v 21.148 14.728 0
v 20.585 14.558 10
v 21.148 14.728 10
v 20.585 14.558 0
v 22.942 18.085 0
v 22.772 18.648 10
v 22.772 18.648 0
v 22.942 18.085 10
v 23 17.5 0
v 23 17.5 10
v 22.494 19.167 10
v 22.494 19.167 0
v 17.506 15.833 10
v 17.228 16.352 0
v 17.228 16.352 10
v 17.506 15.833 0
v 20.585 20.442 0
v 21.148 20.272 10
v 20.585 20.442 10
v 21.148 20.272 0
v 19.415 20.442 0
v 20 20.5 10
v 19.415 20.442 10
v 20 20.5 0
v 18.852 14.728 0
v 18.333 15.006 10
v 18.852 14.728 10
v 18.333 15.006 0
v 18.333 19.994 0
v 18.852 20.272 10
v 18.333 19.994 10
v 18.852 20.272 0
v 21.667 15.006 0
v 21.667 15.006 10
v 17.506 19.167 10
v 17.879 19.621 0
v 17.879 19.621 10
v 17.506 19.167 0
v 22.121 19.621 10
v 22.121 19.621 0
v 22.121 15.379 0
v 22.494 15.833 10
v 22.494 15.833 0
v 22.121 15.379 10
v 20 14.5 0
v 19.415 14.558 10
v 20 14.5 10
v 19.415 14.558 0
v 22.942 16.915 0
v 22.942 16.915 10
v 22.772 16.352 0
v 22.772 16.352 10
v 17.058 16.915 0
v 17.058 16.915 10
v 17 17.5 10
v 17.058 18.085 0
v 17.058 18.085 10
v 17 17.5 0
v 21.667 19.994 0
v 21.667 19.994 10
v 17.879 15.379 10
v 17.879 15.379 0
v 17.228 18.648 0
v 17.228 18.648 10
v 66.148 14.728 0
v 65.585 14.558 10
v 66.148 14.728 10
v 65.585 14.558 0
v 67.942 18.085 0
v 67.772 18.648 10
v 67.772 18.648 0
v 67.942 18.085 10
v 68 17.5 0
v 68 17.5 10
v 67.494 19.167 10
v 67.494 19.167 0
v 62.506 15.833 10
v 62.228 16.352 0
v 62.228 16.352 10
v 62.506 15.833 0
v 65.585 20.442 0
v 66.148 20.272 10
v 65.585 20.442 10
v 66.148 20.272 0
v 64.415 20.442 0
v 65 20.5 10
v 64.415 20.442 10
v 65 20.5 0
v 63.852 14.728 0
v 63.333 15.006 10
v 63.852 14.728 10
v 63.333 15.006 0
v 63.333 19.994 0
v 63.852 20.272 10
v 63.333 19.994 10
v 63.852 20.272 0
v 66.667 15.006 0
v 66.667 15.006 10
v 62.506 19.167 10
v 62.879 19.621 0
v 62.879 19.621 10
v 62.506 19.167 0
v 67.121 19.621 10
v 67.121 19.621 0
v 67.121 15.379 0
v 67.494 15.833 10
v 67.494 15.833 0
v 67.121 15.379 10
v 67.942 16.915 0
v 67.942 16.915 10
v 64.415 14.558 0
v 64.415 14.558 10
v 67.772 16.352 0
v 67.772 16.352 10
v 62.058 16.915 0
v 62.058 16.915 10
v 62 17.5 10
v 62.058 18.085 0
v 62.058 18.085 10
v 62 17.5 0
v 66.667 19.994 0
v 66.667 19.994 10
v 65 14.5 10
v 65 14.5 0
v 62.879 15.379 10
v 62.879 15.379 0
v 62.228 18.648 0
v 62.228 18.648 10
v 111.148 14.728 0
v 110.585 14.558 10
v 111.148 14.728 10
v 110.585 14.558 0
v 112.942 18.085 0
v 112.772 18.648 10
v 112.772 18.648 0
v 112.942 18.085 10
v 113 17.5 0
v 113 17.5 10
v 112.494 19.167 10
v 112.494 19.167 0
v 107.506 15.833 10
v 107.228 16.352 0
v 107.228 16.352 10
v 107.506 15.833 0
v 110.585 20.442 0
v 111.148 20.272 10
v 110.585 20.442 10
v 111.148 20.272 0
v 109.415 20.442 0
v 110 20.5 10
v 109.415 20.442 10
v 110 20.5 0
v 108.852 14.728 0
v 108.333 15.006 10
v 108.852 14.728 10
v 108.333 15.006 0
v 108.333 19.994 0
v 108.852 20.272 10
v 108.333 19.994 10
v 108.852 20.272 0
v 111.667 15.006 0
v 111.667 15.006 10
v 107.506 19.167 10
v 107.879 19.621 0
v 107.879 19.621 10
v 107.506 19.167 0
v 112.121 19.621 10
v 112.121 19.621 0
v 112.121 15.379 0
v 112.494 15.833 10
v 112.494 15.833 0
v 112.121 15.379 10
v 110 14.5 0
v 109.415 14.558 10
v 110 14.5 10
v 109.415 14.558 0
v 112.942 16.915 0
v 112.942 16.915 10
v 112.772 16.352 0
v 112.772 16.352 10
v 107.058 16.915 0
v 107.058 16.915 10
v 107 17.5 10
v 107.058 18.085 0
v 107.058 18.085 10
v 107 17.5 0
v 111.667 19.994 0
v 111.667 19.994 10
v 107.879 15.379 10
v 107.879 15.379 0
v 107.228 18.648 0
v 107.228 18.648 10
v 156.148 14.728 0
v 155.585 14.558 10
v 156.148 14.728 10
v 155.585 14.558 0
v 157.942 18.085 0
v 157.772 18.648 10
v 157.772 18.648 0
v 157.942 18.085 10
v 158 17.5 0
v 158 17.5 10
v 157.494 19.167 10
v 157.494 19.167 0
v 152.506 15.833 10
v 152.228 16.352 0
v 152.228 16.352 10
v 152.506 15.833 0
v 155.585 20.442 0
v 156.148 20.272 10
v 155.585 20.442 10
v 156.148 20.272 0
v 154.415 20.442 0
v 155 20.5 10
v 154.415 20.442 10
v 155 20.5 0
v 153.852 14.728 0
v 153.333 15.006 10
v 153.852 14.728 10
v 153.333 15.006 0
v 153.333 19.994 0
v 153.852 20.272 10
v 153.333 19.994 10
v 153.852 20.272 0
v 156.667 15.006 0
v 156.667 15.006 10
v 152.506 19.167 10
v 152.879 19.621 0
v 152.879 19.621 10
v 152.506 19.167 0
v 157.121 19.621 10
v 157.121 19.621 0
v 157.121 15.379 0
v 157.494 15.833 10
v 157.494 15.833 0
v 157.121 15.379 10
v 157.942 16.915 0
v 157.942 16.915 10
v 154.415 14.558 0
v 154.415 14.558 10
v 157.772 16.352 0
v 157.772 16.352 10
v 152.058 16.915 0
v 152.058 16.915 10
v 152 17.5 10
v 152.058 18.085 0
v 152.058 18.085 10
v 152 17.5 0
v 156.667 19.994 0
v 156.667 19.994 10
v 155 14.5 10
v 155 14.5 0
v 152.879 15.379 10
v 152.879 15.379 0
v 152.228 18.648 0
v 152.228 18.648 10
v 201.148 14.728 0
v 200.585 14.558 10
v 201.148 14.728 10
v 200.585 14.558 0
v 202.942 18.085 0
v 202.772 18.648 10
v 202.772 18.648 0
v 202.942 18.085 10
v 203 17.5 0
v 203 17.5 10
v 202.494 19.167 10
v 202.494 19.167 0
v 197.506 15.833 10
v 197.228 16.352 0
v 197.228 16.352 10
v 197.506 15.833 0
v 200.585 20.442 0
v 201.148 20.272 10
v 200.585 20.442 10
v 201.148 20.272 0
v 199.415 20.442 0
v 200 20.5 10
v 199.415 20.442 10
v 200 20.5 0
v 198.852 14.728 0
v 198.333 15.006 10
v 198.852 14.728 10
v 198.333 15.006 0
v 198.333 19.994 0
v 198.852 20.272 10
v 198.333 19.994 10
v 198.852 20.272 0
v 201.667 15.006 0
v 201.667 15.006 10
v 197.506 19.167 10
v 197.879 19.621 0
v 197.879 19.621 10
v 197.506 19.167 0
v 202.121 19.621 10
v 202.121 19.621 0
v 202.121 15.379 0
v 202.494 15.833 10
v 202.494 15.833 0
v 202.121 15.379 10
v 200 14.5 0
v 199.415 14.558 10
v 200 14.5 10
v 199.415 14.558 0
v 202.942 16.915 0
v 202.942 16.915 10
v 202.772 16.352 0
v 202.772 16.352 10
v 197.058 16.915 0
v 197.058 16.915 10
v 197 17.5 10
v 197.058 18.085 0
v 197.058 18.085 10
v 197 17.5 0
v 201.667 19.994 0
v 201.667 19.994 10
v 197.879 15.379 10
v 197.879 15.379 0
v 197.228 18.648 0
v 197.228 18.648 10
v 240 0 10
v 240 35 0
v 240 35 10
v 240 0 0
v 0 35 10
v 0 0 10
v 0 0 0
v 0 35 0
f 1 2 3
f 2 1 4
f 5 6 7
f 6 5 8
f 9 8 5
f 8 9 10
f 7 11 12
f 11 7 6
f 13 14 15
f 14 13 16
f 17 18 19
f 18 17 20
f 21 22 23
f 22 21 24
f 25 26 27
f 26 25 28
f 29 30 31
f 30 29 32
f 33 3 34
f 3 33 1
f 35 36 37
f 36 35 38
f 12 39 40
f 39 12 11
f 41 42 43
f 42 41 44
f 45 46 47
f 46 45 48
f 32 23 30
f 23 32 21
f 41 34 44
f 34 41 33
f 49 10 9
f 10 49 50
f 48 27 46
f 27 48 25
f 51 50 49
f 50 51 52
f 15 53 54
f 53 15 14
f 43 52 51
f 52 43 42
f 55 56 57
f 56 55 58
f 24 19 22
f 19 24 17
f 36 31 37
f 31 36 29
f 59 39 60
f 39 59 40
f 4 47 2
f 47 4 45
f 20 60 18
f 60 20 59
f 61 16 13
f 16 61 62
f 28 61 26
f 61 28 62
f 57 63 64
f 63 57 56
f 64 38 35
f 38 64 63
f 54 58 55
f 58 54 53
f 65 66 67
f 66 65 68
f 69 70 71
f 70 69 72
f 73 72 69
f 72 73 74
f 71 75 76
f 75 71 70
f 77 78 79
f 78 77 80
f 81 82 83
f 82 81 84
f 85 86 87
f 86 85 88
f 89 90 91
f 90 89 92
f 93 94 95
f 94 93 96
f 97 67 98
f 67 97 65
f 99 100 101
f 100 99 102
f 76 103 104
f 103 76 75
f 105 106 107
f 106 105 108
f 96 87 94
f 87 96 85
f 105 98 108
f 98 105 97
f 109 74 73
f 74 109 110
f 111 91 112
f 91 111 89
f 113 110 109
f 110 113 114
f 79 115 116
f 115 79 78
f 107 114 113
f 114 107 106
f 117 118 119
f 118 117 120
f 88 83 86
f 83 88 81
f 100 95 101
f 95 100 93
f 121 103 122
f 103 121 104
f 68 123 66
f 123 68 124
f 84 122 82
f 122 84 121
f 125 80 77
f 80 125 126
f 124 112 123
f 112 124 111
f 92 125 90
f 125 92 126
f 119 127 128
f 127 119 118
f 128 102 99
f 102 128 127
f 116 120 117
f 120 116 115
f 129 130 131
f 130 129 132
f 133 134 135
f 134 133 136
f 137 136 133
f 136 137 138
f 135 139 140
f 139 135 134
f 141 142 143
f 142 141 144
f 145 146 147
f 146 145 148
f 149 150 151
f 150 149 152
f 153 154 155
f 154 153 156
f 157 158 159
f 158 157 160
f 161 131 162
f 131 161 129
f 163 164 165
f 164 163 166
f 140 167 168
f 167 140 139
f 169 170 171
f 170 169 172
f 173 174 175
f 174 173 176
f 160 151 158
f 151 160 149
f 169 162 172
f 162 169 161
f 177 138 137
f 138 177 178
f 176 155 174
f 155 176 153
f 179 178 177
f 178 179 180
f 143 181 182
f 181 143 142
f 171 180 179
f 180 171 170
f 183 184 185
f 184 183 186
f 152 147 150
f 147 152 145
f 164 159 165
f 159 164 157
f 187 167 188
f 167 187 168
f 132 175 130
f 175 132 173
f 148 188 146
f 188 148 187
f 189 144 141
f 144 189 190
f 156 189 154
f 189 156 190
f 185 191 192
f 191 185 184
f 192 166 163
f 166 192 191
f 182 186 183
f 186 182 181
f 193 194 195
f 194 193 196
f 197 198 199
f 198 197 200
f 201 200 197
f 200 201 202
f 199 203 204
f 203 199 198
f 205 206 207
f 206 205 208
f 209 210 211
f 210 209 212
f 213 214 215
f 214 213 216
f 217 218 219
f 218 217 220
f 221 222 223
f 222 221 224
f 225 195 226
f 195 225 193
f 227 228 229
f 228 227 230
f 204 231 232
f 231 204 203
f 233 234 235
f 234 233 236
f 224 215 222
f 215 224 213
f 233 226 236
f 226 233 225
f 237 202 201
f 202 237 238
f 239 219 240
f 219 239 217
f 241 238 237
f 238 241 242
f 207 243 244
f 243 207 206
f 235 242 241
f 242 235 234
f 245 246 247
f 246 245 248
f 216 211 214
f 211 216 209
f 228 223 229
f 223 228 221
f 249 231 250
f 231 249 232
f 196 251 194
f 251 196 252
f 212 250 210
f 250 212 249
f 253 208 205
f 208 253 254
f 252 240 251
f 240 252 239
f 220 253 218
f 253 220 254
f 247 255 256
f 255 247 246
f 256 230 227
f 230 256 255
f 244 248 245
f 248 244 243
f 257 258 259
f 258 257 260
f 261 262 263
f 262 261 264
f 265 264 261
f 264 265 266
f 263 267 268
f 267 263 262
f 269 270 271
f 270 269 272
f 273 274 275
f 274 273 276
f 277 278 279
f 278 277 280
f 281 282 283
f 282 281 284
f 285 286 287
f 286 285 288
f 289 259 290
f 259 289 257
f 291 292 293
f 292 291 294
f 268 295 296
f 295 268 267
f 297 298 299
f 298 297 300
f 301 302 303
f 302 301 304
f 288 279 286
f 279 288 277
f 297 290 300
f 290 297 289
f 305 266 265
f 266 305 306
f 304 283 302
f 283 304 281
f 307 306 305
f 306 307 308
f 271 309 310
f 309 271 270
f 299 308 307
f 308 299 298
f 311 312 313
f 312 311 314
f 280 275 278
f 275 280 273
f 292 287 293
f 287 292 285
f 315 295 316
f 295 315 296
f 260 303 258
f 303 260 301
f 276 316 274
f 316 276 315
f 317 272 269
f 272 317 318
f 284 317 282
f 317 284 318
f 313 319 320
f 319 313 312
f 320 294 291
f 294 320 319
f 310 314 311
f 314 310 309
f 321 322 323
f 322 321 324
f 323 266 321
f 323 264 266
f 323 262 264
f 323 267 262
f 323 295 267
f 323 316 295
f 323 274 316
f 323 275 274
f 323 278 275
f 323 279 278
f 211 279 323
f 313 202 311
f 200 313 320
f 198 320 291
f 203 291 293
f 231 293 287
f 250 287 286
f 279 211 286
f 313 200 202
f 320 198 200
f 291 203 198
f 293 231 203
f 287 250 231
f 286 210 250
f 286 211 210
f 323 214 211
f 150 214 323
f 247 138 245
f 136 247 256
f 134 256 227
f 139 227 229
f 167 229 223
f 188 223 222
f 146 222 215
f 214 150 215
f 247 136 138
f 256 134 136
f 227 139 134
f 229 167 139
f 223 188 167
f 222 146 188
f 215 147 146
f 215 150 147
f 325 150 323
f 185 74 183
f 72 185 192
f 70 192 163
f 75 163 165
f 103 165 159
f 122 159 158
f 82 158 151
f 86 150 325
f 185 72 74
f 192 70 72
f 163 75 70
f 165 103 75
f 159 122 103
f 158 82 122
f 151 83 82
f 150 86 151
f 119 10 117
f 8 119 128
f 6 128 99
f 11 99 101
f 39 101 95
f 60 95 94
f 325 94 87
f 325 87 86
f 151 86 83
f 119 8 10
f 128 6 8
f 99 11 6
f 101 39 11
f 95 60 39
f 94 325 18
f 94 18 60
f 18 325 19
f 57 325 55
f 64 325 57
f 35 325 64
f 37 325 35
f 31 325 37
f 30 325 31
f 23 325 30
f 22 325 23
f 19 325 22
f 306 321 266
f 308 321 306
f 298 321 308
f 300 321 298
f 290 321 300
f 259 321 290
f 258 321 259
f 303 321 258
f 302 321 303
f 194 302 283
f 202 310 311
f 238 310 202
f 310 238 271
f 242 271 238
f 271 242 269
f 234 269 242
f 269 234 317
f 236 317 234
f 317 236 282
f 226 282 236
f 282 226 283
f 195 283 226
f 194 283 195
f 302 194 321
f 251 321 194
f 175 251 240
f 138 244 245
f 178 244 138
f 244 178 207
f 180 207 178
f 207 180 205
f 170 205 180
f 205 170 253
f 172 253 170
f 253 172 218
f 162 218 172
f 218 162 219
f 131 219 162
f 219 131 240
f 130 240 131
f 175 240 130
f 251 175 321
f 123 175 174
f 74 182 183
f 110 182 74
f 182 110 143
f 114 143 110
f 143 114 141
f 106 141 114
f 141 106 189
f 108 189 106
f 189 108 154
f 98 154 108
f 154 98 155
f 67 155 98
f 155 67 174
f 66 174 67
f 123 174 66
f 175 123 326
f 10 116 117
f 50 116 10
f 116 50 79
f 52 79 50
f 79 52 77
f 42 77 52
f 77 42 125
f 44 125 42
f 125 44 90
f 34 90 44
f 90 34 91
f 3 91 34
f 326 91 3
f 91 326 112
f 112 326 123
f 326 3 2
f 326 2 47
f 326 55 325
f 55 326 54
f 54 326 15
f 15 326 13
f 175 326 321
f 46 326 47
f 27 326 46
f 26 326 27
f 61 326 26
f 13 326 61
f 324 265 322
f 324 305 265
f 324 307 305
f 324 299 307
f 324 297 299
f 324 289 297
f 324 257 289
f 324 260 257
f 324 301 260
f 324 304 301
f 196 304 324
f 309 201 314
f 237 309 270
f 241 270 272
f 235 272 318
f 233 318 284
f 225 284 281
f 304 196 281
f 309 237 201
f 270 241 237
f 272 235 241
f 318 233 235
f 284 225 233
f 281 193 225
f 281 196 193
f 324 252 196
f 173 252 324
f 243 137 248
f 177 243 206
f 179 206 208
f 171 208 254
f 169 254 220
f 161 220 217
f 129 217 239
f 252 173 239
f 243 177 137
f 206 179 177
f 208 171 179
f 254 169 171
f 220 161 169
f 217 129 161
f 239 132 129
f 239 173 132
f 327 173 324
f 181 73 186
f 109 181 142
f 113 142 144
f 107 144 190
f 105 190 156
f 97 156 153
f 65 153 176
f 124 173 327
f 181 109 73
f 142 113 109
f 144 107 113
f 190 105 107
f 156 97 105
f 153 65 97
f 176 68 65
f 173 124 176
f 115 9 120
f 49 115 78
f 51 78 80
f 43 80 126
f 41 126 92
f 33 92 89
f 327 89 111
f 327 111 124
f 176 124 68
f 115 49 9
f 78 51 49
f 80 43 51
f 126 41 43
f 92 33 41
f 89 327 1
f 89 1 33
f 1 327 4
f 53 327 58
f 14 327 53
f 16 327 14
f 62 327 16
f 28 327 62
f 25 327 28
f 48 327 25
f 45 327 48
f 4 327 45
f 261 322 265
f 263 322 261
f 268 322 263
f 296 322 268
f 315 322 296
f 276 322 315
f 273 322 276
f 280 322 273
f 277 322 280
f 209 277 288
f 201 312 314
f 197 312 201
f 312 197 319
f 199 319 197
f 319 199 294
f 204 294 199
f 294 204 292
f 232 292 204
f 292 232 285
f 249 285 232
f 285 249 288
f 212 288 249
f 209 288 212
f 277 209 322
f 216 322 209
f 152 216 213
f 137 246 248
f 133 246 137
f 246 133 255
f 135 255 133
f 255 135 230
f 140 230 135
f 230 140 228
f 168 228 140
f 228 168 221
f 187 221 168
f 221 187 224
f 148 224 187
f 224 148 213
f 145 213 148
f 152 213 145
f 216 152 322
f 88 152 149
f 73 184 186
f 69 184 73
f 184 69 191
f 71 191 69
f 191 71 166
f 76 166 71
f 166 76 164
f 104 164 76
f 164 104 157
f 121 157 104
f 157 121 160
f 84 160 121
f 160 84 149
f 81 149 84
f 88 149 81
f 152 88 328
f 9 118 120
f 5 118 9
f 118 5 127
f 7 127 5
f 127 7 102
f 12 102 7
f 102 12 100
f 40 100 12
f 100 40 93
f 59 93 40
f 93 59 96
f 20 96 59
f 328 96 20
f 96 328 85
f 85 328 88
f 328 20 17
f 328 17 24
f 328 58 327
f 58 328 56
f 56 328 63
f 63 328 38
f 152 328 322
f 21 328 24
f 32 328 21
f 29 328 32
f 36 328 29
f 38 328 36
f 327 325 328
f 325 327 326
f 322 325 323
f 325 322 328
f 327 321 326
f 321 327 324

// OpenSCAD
$fn = 32;

// ----------------------------------------------------------------------
// Long rail: 200-250 mm mounting rail
// ----------------------------------------------------------------------

// --- parameters (mm) ---
rail_l = 240;             // rail length, X
rail_w = 35;              // rail width, Y
rail_t = 10;              // rail thickness, Z
hole_d = 6;               // mounting hole diameter
hole_start = 20;          // first hole offset from the end
hole_pitch = 45;          // hole pitch
holes = 5;                // number of holes

difference() {
  cube([rail_l, rail_w, rail_t]);
  for (i = [0 : holes - 1])
    translate([hole_start + i * hole_pitch, rail_w / 2, -1])
      cylinder(h = rail_t + 2, d = hole_d);
}
